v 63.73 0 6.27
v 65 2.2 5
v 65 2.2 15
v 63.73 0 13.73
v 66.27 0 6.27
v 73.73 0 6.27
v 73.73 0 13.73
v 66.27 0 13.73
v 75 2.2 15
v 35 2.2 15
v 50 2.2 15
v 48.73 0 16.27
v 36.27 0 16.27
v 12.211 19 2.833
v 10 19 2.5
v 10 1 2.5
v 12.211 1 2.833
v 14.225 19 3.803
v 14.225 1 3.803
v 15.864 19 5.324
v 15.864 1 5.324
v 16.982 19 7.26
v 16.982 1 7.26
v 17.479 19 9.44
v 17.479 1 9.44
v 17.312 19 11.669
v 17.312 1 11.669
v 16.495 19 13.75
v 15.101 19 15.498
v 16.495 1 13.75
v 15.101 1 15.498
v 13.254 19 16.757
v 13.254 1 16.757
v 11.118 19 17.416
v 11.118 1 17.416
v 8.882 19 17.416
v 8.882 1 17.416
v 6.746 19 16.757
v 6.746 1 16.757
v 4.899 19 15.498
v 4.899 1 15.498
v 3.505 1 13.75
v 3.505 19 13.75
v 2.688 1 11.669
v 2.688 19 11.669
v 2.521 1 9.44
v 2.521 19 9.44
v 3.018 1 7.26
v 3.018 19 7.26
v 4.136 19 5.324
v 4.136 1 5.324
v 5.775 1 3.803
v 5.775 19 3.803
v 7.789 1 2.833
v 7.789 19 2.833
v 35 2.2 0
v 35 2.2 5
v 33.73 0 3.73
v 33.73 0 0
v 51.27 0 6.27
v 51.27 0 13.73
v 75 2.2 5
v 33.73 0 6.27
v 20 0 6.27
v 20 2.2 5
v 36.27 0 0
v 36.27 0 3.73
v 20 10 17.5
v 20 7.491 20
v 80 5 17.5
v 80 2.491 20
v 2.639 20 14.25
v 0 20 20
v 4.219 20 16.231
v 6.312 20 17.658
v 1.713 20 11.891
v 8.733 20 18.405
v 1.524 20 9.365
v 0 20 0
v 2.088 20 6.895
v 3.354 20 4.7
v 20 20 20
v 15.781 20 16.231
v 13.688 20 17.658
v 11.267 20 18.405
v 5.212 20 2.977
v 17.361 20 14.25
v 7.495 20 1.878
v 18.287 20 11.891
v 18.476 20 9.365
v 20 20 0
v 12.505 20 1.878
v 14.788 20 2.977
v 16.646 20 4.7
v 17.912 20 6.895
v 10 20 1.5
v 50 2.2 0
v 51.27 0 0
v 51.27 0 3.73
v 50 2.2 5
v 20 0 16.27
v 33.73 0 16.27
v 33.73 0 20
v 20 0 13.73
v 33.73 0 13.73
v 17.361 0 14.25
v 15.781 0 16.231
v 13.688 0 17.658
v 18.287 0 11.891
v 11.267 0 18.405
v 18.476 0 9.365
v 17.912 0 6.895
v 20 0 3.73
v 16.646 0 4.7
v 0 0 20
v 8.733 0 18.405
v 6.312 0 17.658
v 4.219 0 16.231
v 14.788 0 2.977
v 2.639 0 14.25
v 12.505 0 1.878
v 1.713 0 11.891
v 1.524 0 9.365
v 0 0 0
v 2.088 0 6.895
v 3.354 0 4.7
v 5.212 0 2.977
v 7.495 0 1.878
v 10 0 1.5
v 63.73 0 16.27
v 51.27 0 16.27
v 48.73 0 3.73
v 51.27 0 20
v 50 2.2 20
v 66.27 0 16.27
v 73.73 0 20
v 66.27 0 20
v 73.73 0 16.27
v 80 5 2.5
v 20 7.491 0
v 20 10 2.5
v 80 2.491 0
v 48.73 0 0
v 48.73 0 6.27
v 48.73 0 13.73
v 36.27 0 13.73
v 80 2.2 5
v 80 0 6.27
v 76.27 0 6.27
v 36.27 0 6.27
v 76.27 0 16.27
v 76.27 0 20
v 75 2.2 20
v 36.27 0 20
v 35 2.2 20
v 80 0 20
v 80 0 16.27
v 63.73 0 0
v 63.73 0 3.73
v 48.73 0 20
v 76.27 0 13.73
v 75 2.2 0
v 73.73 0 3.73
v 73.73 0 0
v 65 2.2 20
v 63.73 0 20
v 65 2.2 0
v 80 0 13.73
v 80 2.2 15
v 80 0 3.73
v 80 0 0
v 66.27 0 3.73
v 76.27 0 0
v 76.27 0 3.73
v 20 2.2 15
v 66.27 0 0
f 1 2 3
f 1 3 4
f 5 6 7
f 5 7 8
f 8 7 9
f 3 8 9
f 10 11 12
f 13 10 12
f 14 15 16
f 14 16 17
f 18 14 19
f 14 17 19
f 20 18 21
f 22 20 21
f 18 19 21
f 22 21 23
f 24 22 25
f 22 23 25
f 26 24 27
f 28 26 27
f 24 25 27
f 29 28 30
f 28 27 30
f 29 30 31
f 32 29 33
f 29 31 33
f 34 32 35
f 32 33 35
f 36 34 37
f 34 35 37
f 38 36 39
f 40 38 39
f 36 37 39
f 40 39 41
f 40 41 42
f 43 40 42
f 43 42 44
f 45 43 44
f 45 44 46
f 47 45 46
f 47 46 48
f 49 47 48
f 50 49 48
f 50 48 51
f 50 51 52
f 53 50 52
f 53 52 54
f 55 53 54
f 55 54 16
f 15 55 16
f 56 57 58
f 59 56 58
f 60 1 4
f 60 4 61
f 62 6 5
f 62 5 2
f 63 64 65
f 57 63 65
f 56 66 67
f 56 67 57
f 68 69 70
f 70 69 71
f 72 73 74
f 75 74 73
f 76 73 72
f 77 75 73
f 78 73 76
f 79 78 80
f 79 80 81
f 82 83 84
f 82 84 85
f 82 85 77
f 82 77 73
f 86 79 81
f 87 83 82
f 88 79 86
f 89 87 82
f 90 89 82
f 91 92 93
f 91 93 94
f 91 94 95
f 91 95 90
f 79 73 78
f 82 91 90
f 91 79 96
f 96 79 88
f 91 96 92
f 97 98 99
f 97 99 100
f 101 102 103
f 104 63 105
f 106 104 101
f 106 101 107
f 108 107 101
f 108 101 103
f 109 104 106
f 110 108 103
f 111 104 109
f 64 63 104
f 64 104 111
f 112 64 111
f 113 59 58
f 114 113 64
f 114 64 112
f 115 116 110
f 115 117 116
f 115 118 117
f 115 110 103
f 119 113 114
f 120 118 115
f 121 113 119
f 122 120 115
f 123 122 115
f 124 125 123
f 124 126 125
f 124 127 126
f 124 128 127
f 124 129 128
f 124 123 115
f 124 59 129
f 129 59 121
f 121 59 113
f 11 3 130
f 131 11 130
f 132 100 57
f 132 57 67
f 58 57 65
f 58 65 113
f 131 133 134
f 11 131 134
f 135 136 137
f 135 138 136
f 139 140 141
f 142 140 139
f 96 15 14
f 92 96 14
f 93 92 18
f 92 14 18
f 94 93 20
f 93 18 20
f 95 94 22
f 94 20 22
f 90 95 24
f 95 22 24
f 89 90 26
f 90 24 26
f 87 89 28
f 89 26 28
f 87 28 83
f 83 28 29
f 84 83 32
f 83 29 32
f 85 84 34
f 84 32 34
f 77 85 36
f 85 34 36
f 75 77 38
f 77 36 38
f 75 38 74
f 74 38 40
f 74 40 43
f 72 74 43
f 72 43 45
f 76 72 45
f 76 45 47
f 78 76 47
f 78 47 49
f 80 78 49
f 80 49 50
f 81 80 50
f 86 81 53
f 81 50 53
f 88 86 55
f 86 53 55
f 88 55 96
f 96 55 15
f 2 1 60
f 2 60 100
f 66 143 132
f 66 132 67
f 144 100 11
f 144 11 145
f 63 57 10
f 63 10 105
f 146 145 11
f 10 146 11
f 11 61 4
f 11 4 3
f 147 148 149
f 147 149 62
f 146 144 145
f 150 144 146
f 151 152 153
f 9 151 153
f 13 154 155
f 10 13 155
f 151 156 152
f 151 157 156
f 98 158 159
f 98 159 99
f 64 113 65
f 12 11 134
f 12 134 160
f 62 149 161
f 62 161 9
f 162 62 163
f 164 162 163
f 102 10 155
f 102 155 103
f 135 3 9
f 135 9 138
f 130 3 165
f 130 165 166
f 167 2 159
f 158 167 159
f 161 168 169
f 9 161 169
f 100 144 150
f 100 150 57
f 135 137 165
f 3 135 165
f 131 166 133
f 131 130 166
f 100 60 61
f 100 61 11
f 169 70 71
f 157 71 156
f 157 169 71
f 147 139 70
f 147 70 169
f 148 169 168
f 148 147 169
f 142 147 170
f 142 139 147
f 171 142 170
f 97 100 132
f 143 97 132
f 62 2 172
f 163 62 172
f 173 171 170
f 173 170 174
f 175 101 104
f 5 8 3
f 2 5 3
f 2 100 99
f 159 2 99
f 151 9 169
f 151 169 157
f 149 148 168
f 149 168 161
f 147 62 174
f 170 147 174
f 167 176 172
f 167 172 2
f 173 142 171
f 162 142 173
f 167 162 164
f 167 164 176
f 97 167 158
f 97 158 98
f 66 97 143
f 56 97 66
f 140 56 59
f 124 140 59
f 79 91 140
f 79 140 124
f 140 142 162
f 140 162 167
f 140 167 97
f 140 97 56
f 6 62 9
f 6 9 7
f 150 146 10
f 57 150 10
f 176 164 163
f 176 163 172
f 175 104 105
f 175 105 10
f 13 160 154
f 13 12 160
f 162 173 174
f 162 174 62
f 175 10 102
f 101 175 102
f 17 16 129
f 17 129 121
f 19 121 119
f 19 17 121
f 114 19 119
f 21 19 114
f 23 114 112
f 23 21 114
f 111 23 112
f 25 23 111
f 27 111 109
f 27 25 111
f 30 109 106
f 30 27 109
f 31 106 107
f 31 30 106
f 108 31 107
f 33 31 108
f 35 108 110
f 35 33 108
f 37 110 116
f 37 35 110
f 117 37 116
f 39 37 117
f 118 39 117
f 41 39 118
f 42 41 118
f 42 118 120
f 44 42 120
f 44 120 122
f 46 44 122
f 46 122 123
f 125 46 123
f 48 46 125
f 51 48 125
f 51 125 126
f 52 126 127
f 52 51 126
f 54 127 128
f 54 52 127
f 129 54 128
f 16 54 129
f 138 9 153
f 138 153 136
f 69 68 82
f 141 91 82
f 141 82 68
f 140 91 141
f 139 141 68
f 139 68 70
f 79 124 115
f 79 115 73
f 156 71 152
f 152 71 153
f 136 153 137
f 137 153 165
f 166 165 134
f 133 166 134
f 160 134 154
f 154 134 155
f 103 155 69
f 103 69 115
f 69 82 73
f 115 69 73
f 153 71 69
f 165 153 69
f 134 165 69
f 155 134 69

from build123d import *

# Parameters (mm, degrees)
BOSS_EXTRUDE1_DEPTH = 20
CHAMFER1_SIZE       = 2.5
SKETCH2_R           = 7.5
CUT_EXTRUDE1_DEPTH  = 85.852813742
CUT_EXTRUDE2_DEPTH  = 60
CUT_EXTRUDE3_DEPTH  = 85.852813742
CHAMFER2_SIZE       = 1


with BuildPart() as part:
    # Sketch1 → Boss-Extrude1 (new body)
    with BuildSketch(Plane.XY):
        Polygon((0, 0), (0, 20), (20, 20), (20, 10), (80, 5), (80, 0), align=None)
    extrude(amount=BOSS_EXTRUDE1_DEPTH)

    # Chamfer1
    chamfer1_edges = [part.edges().sort_by_distance(p)[0] for p in [
        (50, 7.5, 20),
        (50, 7.5, 0),
    ]]
    chamfer(chamfer1_edges, length=CHAMFER1_SIZE)

    # Sketch2 → Cut-Extrude1 (cut, through all)
    with BuildSketch(Plane(origin=(0, 0, 0), x_dir=(-1, 0, 0), z_dir=(0, -1, 0))):
        with Locations(Location((-10, -10, 0), (0, 0, 90))):
            Circle(SKETCH2_R)
    extrude(amount=-CUT_EXTRUDE1_DEPTH, mode=Mode.SUBTRACT)

    # Sketch3 → Cut-Extrude2 (cut)
    with BuildSketch(Plane(origin=(80, 0, 0), x_dir=(0, 0, -1), z_dir=(1, 0, 0))):
        Polygon((-15, 2.199704526), (-16.27, 0), (-13.73, 0), align=None)
        Polygon((-6.27, 0), (-5, 2.199704526), (-3.73, 0), align=None)
    extrude(amount=-CUT_EXTRUDE2_DEPTH, mode=Mode.SUBTRACT)

    # Sketch4 → Cut-Extrude3 (cut, through all)
    with BuildSketch(Plane.XY):
        Polygon((75, 2.199704526), (73.73, 0), (76.27, 0), align=None)
        Polygon((65, 2.199704526), (63.73, 0), (66.27, 0), align=None)
        Polygon((50, 2.199704526), (48.73, 0), (51.27, 0), align=None)
        Polygon((35, 2.199704526), (33.73, 0), (36.27, 0), align=None)
    extrude(amount=CUT_EXTRUDE3_DEPTH, mode=Mode.SUBTRACT)

    # Chamfer2
    chamfer2_edges = [part.edges().sort_by_distance(p)[0] for p in [
        (10, 20, 17.5),
        (10, 0, 17.5),
    ]]
    chamfer(chamfer2_edges, length=CHAMFER2_SIZE)


solid = part.part
